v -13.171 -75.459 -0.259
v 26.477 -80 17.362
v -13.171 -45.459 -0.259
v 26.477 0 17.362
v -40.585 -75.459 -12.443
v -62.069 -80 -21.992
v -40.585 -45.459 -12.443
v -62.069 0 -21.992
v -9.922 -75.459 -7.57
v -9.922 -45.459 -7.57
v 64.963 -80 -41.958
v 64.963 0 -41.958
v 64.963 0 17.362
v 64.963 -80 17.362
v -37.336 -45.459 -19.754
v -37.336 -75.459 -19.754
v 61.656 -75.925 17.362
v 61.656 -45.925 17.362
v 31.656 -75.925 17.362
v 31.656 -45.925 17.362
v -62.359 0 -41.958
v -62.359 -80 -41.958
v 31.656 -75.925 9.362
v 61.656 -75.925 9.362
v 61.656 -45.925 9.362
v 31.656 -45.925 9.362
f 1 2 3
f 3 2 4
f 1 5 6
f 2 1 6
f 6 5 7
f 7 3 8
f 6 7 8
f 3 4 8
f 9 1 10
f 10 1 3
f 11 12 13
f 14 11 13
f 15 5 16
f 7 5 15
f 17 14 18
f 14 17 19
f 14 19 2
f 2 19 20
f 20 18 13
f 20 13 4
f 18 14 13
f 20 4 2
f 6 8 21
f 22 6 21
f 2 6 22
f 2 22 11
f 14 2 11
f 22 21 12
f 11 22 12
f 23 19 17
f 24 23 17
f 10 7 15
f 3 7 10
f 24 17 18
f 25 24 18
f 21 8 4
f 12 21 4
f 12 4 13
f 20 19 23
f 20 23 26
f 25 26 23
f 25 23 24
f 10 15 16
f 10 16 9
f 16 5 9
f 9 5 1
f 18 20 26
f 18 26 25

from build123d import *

# Parameters (mm, degrees)
F1_DEPTH = 80
F2_W     = 30
F2_H     = 30
F3_DEPTH = 8
F4_W     = 30
F4_H     = 30
F5_DEPTH = 8


with BuildPart() as f1:
    # F0 (on Front) → F1 (new body)
    with BuildSketch(Plane.XZ):
        Polygon((-62.069241, -21.991899), (-62.35861, -41.958228), (64.962916, -41.958228), (64.962916, 17.362025), (26.477087, 17.362025), align=None)
    extrude(amount=F1_DEPTH)

    # F2 (on face) → F3 (cut)
    with BuildSketch(Plane.XY.offset(17.362025)):
        with Locations((46.655876, -60.924847)):
            Rectangle(F2_W, F2_H)
    extrude(amount=-F3_DEPTH, mode=Mode.SUBTRACT)

    # F4 (on face) → F5 (cut)
    with BuildSketch(Plane(origin=(-2.076283, 0, 4.671638), x_dir=(0.913812, 0, 0.406138), z_dir=(-0.406138, 0, 0.913812))):
        with Locations((-27.1411, -60.458847)):
            Rectangle(F4_W, F4_H)
    extrude(amount=-F5_DEPTH, mode=Mode.SUBTRACT)


solid = f1.part
